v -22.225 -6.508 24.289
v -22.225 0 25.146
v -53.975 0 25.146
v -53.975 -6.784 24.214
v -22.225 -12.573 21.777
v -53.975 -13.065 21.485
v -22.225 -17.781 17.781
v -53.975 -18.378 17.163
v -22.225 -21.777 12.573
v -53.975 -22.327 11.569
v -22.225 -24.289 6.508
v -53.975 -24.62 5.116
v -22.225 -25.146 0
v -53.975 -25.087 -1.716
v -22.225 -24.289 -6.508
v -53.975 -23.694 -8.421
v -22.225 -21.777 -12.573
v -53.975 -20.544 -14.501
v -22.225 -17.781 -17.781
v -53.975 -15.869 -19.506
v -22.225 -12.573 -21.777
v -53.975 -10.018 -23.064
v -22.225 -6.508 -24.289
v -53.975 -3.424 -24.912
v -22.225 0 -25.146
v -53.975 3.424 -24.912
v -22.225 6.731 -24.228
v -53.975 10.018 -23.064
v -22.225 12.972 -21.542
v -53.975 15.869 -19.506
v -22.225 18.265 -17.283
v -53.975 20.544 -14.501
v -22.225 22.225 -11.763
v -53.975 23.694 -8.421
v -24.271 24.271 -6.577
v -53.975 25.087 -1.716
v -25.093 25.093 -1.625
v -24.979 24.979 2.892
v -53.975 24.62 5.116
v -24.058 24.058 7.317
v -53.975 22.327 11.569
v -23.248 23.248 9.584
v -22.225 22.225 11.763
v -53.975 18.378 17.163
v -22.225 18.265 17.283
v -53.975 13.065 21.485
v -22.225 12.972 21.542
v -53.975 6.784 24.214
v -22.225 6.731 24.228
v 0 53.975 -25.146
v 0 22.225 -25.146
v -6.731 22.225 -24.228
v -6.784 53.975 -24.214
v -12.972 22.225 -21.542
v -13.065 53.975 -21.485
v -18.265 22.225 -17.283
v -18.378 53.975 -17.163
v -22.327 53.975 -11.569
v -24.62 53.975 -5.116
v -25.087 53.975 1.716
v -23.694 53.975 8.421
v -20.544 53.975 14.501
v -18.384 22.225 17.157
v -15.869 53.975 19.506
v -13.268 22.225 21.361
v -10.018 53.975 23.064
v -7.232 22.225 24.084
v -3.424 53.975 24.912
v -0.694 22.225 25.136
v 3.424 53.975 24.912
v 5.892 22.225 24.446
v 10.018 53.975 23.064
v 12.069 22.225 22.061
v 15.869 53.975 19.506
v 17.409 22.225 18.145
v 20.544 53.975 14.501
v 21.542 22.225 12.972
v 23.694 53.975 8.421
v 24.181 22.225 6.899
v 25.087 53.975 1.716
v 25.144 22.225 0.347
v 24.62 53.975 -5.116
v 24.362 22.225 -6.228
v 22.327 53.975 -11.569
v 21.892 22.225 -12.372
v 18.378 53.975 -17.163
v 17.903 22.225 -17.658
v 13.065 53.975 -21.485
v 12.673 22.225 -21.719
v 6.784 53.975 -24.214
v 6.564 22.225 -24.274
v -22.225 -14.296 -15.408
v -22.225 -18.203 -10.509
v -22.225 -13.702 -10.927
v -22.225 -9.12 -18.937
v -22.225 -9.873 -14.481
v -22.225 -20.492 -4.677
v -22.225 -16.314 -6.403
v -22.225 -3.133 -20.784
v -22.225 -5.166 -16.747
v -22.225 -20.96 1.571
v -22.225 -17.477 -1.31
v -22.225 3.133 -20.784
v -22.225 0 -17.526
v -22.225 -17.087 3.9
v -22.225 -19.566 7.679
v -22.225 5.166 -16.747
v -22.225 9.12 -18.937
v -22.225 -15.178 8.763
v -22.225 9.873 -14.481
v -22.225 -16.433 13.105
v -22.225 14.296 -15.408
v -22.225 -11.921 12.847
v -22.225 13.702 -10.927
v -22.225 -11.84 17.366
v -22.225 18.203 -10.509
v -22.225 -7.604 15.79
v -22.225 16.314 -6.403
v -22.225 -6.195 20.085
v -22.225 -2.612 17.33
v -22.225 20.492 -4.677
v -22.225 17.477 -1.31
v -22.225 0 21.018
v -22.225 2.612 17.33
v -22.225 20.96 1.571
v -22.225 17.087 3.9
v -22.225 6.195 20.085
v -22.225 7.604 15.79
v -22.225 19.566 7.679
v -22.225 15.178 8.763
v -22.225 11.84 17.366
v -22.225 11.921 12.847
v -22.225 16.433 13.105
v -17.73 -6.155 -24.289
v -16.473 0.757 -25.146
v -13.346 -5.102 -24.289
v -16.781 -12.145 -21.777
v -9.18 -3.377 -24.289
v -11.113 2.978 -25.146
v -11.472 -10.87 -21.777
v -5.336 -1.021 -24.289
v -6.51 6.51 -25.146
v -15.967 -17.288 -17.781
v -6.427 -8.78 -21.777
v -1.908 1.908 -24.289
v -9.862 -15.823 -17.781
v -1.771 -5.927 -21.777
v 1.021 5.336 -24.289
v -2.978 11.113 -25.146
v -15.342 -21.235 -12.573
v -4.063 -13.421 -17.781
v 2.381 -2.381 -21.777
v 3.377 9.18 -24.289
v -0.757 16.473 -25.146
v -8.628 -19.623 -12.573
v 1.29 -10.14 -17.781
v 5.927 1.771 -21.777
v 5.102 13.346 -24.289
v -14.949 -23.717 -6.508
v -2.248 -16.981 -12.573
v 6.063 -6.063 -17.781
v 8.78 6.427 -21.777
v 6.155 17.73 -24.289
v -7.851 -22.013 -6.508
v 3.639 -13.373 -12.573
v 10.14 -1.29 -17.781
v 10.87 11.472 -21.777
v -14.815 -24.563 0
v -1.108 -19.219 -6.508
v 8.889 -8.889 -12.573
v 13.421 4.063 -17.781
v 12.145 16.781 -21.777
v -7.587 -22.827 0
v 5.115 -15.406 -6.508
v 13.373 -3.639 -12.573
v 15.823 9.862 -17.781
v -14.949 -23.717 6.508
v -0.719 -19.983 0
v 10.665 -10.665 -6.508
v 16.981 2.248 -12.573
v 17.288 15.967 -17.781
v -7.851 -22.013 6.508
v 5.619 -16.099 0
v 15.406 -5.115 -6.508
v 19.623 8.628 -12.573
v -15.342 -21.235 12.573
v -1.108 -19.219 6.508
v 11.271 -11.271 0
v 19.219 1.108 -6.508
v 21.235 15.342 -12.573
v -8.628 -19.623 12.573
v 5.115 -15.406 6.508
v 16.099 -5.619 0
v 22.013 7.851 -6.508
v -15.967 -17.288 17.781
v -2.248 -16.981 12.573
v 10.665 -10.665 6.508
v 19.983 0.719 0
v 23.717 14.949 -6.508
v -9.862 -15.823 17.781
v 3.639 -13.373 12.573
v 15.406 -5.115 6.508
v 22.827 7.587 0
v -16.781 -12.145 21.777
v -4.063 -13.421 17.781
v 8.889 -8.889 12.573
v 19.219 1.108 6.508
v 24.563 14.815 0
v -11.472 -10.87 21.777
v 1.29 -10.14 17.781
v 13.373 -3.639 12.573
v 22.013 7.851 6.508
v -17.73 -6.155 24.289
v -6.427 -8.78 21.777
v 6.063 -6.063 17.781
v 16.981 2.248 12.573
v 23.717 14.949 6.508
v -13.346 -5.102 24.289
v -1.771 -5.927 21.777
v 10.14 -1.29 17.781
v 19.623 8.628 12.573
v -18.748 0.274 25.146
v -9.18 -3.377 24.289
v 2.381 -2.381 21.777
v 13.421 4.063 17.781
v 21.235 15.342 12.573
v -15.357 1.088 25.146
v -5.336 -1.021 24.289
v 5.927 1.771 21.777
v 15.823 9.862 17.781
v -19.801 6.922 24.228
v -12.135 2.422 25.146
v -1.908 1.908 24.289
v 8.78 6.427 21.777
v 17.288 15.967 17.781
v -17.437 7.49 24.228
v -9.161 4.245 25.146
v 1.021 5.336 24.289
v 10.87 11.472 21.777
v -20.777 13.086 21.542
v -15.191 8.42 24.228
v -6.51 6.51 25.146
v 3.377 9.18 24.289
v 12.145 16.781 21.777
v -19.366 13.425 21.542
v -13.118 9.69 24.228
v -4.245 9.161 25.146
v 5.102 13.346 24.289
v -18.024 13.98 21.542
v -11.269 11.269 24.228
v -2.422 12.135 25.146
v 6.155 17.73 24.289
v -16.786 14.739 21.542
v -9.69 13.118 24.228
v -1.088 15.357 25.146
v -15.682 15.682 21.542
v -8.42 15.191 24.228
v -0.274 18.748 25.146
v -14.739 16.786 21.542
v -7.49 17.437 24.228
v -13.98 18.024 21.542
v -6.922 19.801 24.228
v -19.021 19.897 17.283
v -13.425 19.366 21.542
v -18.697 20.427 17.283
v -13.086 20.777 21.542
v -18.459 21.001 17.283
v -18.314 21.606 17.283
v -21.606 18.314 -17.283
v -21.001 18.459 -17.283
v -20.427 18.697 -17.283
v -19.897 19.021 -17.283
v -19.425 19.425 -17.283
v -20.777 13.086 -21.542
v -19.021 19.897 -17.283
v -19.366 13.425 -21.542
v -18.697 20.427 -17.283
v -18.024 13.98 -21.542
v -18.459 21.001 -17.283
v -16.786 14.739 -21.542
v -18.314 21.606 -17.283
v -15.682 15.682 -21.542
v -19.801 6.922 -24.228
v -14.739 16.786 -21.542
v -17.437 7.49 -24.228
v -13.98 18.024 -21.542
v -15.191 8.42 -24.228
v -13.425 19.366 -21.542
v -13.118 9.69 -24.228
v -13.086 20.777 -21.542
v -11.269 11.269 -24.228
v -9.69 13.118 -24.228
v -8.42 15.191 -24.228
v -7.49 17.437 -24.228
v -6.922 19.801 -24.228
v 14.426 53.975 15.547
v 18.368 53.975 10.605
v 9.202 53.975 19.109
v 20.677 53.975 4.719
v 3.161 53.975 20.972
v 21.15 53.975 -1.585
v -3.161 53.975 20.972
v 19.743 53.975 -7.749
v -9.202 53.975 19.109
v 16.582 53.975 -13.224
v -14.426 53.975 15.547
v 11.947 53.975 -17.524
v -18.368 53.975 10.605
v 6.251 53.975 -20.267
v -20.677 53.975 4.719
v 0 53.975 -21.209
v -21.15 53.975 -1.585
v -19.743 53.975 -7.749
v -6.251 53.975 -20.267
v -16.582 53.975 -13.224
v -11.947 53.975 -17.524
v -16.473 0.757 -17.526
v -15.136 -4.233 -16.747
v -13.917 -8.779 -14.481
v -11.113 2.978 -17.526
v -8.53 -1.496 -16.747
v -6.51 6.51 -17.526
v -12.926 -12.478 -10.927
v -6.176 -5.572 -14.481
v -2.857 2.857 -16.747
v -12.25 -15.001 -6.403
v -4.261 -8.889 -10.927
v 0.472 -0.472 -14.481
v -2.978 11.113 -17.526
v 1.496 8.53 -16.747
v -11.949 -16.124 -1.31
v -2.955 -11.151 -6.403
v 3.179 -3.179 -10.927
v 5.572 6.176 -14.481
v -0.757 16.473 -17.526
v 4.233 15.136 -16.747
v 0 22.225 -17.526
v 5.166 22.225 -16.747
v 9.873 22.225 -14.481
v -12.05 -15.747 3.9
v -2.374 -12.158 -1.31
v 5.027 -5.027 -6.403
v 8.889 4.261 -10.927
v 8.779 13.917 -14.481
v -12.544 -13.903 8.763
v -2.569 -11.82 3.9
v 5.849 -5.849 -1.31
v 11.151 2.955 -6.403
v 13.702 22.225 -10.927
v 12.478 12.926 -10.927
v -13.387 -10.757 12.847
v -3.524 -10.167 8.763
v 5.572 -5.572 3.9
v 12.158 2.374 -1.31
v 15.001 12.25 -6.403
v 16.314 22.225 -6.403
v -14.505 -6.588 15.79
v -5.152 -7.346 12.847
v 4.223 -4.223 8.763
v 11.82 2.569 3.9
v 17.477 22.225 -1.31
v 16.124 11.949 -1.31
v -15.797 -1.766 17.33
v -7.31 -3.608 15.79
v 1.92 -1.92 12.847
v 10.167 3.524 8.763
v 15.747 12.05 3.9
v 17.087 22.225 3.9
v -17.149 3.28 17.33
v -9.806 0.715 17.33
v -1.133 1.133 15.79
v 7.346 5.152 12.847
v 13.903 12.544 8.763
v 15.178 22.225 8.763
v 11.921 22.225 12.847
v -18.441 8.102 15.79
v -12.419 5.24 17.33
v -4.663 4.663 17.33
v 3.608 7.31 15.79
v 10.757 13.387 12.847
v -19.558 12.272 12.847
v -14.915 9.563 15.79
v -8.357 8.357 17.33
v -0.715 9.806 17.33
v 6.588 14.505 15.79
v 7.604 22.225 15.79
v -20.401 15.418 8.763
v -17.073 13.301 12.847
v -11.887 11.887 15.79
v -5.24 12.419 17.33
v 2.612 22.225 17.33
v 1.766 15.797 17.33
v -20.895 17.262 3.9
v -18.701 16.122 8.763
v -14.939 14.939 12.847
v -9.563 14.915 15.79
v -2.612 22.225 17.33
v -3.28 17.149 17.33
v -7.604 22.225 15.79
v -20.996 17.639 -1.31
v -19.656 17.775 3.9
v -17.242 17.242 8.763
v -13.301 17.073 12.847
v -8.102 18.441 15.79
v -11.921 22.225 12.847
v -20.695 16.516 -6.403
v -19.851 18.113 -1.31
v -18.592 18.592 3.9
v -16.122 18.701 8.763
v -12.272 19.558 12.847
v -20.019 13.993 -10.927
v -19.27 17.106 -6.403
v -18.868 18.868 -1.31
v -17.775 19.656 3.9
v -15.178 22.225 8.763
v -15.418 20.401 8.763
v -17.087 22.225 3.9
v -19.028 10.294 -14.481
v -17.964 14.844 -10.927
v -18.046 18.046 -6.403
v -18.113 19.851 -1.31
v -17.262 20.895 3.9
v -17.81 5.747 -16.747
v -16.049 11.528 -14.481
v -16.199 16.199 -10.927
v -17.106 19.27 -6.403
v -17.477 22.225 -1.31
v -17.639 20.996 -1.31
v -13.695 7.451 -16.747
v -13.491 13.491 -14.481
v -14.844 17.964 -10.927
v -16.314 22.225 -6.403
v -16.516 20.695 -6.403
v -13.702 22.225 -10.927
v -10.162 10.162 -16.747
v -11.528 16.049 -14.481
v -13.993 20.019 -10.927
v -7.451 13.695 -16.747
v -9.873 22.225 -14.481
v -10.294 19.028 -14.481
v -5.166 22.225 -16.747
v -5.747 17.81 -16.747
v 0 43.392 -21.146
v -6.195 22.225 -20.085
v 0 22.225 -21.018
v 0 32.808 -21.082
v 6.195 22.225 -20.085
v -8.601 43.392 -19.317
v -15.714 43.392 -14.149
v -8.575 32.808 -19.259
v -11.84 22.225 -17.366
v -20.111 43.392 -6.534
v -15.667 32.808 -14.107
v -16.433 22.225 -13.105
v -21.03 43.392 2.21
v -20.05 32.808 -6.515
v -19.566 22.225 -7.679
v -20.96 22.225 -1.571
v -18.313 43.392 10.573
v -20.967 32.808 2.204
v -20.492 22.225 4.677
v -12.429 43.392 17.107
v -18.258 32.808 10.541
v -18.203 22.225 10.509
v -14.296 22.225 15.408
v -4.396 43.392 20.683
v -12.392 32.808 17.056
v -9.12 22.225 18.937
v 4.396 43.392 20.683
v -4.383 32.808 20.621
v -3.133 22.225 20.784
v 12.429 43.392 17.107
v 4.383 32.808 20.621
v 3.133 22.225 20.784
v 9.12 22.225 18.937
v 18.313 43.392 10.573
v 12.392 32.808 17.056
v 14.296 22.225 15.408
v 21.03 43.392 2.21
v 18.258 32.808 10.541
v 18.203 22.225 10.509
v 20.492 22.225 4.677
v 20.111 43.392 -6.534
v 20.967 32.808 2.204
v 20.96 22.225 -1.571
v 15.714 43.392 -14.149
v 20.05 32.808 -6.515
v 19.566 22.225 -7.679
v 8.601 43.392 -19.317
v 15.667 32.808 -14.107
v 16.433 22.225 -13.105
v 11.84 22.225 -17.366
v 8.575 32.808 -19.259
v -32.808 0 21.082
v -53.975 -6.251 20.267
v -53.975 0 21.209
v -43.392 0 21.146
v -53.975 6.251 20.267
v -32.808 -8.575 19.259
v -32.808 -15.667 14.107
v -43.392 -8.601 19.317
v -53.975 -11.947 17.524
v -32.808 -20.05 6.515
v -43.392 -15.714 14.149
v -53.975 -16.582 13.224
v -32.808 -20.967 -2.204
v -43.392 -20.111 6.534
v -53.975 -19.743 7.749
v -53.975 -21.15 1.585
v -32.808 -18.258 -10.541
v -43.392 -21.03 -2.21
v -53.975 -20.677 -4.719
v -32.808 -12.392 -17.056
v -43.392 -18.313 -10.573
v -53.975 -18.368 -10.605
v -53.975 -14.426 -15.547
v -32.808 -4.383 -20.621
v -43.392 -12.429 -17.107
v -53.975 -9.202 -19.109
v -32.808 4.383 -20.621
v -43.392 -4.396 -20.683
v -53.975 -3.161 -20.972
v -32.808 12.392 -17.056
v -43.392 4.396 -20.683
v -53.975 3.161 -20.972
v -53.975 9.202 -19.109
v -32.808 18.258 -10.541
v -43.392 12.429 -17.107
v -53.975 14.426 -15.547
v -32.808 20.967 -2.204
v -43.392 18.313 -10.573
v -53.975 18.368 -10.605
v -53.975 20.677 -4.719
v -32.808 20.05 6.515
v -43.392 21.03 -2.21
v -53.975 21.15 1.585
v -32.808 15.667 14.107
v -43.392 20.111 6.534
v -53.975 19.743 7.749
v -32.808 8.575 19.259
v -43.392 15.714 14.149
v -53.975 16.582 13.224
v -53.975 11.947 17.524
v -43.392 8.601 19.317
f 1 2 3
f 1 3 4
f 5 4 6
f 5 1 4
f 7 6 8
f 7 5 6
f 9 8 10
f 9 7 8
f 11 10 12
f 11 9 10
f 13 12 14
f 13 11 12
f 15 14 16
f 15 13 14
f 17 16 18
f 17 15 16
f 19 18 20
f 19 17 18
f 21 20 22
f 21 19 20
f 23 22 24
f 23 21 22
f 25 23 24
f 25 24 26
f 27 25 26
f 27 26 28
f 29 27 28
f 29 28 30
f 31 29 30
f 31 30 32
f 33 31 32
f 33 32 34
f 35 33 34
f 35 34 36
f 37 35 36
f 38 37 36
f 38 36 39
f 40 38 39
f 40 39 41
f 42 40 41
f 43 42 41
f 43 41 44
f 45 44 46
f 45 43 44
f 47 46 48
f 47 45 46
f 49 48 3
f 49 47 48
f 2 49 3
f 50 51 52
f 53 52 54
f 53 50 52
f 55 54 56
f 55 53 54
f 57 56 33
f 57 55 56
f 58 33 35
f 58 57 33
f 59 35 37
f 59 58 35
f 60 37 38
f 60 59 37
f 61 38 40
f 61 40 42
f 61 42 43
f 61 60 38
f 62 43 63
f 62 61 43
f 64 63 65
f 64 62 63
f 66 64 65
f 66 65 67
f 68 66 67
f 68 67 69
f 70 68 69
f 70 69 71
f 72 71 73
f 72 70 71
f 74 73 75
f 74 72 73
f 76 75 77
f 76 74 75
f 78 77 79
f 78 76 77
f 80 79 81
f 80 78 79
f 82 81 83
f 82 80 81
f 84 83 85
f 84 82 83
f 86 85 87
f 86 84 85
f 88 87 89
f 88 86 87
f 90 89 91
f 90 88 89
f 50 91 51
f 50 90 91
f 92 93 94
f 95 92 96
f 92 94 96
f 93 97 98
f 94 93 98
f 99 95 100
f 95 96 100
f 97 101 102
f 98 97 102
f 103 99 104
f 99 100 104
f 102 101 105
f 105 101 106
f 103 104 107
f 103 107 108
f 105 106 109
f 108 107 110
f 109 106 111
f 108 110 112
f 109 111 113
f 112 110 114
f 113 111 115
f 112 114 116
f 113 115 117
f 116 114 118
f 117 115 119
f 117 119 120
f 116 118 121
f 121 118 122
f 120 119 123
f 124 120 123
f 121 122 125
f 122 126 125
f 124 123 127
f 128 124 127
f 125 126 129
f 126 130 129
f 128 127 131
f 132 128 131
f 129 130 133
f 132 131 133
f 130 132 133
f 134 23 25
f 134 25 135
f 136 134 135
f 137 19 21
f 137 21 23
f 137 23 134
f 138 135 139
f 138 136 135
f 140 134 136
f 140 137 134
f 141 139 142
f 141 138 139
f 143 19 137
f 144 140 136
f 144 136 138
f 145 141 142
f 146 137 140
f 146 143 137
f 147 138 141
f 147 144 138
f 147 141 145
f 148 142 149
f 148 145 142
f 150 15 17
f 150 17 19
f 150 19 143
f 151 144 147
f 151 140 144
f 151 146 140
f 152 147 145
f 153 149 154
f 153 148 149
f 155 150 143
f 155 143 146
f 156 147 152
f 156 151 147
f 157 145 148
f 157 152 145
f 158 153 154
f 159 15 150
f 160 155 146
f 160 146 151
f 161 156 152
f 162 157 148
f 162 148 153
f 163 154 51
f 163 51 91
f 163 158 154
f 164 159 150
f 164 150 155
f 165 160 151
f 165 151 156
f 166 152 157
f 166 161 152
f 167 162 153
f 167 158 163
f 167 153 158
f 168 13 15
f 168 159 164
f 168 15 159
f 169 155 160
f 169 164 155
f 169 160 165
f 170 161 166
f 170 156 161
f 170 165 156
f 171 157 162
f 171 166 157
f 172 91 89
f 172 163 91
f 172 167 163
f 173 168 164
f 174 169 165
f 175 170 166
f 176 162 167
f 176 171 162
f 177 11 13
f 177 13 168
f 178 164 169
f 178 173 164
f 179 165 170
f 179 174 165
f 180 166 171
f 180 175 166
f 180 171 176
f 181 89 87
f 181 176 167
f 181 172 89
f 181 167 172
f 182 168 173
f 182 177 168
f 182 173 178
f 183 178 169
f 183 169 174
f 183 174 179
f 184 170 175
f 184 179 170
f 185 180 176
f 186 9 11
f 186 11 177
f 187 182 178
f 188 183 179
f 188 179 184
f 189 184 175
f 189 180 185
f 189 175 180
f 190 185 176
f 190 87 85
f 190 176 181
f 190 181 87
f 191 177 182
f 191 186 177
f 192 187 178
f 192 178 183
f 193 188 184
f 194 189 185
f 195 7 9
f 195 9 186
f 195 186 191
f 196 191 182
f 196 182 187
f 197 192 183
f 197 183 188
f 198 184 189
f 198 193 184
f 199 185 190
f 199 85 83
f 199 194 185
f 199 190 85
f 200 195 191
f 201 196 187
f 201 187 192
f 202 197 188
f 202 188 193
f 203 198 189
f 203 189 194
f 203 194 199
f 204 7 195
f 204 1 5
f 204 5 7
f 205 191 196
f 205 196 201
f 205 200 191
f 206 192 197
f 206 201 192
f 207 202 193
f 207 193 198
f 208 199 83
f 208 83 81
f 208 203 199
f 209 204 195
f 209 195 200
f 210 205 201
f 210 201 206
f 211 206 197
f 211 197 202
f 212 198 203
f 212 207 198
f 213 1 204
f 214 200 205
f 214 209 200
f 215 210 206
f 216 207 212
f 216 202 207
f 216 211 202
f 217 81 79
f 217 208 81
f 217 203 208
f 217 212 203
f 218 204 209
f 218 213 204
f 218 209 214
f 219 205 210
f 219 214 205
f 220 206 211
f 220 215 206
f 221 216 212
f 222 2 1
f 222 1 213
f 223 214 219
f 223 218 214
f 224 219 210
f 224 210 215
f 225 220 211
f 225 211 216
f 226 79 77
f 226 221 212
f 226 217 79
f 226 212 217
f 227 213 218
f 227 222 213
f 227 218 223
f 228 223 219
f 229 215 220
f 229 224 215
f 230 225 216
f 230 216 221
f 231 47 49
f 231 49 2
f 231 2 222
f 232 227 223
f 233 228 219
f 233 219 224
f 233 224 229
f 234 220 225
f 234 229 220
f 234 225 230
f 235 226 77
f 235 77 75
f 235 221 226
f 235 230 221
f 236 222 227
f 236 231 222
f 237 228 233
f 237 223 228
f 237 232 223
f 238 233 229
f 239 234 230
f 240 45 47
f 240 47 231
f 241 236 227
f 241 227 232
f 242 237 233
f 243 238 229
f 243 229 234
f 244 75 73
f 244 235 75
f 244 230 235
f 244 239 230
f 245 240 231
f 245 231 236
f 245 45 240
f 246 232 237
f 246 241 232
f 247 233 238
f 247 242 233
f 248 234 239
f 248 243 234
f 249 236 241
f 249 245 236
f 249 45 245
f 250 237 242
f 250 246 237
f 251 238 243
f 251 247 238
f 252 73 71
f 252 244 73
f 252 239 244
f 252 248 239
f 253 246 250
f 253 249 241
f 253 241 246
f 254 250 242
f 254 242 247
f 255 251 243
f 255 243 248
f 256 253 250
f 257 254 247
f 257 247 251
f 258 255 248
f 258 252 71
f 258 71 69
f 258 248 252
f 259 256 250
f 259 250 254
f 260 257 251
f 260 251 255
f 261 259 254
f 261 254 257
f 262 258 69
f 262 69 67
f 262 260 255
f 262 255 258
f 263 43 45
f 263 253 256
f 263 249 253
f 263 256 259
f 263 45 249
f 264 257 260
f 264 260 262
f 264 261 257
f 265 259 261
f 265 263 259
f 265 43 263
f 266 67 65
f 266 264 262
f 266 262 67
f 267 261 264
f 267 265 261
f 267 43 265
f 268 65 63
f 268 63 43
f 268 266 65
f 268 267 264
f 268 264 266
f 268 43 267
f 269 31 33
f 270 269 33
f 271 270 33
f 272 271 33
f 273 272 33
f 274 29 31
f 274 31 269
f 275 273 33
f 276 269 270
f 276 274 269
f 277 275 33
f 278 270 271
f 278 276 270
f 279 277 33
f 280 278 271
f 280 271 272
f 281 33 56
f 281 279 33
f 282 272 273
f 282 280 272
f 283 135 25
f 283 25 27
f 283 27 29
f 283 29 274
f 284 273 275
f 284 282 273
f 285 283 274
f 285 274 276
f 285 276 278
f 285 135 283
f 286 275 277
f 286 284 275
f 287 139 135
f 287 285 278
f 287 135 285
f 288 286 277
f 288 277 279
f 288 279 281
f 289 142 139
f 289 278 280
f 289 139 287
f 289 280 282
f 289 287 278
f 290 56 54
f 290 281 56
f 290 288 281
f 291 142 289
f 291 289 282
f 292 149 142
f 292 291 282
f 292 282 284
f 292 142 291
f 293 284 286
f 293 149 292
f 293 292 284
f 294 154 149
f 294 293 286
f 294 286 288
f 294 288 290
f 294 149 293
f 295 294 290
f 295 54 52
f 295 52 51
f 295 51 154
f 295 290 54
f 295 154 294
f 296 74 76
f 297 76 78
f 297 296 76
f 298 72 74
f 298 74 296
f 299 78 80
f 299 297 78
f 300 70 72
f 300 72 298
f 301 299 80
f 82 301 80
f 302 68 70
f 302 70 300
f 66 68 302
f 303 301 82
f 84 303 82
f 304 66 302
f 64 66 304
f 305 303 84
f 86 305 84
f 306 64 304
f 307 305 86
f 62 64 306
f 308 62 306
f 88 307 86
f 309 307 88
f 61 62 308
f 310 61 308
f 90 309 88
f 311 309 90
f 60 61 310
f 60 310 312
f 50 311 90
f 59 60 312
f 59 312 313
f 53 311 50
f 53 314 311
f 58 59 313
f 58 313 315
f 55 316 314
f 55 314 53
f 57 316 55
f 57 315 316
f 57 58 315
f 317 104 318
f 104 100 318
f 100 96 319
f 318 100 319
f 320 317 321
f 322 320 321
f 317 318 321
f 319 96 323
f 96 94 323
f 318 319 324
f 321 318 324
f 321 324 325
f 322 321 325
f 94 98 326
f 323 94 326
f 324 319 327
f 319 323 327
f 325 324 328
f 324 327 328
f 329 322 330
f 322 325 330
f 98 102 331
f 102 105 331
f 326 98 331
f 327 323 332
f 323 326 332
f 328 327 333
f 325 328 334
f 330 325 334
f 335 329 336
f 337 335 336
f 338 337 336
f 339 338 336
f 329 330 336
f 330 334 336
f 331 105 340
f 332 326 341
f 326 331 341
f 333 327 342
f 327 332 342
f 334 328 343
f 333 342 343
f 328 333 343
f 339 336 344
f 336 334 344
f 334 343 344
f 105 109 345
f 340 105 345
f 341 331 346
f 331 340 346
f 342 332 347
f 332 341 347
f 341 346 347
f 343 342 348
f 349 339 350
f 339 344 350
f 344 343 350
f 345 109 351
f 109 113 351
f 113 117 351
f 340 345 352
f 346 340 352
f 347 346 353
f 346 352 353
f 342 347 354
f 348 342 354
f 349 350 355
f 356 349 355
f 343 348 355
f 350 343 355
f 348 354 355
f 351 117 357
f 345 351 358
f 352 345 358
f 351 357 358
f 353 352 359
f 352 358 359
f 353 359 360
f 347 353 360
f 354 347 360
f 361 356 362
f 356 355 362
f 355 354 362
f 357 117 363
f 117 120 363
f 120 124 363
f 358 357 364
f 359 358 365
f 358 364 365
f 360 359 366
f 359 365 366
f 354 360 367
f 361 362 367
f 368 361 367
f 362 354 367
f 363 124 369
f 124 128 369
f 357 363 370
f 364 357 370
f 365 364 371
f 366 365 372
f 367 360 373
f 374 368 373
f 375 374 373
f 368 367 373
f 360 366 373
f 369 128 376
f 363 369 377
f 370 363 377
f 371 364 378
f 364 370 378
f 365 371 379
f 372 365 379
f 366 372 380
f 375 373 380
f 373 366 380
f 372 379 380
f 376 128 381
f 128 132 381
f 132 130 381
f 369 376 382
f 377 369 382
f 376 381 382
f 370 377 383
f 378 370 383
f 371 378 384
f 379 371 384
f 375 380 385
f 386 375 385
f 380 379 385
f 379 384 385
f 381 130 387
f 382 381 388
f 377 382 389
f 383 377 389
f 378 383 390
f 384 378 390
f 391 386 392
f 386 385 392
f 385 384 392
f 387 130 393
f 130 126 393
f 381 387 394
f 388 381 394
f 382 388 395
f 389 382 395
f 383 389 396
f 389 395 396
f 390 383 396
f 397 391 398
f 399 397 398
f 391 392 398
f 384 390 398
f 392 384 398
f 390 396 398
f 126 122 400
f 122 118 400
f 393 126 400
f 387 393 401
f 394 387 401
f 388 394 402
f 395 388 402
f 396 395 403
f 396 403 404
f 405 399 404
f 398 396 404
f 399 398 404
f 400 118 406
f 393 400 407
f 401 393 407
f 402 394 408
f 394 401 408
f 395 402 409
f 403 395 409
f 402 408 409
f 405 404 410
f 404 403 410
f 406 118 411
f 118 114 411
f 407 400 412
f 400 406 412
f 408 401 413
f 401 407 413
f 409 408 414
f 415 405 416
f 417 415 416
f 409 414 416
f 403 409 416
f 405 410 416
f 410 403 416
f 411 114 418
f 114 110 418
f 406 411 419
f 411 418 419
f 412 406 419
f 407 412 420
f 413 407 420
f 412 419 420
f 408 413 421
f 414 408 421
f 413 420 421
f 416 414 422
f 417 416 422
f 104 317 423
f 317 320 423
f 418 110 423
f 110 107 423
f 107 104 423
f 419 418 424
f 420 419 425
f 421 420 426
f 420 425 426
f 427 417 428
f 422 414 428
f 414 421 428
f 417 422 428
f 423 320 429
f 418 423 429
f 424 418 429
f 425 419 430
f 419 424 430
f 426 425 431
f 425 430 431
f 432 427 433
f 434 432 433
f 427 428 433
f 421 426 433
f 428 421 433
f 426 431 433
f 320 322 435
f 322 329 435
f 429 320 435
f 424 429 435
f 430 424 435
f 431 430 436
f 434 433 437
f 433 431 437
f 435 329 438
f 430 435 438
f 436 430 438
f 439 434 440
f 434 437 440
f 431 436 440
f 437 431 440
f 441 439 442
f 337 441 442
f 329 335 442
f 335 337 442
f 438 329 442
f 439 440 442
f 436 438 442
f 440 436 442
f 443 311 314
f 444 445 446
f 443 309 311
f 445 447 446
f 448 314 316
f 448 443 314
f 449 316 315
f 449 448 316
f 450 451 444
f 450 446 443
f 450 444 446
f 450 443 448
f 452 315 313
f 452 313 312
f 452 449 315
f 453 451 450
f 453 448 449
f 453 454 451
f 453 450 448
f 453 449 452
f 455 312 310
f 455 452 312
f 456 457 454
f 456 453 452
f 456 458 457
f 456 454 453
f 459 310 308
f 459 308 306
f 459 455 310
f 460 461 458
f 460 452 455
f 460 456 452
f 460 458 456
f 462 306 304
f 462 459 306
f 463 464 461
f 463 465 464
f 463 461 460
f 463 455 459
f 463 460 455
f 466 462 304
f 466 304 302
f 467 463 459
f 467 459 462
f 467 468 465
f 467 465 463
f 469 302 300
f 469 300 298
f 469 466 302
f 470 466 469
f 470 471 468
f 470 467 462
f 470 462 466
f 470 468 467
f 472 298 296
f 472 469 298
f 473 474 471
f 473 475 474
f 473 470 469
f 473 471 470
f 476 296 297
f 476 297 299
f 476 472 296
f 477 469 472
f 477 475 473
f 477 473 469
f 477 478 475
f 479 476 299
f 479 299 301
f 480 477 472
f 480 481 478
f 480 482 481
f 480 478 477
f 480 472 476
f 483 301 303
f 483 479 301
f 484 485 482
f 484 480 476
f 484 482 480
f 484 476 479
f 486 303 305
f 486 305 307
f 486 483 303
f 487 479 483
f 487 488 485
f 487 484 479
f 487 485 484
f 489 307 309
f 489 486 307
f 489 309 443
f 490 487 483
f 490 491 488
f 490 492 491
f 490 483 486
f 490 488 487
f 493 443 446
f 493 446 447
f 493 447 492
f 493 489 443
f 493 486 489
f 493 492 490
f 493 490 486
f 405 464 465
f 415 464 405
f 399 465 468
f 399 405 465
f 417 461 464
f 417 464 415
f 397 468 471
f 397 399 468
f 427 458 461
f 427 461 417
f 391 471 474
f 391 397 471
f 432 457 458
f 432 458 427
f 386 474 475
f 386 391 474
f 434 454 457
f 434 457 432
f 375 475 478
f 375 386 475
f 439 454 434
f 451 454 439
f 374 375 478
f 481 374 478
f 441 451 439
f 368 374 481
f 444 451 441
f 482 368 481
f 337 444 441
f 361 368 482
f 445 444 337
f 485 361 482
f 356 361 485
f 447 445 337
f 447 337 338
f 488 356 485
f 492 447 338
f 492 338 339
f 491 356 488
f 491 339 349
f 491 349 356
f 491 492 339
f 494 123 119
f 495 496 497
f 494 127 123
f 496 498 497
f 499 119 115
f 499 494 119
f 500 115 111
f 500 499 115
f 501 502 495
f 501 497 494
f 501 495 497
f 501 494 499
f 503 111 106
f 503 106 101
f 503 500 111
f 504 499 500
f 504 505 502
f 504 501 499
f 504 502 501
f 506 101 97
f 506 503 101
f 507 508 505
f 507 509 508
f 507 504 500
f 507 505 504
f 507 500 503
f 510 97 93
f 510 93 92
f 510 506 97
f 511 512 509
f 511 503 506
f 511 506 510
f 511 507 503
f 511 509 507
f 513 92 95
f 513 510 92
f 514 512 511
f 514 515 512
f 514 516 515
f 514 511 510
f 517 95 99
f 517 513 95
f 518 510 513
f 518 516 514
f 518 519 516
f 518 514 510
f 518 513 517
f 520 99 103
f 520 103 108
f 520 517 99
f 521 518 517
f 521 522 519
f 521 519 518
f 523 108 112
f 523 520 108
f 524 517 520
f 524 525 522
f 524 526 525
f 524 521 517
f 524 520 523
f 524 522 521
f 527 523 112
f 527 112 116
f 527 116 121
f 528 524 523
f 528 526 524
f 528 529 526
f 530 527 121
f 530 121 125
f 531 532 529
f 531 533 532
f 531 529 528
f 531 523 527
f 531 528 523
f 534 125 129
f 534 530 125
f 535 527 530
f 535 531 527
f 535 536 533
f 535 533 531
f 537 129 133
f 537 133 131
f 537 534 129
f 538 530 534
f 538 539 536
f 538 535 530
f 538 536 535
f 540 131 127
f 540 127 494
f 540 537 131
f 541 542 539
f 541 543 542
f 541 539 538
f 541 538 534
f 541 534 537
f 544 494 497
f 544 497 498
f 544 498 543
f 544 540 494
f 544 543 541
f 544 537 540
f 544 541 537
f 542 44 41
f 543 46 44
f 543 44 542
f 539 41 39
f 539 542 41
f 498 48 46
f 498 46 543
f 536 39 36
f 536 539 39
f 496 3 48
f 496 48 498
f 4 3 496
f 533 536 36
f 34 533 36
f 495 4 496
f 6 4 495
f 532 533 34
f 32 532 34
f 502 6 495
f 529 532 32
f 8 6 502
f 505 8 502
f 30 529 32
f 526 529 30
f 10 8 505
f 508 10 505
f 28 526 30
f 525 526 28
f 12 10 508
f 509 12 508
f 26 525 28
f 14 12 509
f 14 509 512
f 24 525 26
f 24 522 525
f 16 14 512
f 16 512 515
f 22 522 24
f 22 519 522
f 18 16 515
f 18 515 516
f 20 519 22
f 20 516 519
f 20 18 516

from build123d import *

# Parameters (mm, degrees)
SKETCH3_R   = 25.146
SKETCH3_R_2 = 17.526


with BuildPart() as part:
    # Sketch1 → Revolve1 (revolve)
    with BuildSketch(Plane.XY):
        Polygon((-53.975, -25.146), (-22.225, -25.146), (-22.225, -21.0185), (-53.975, -21.209), align=None)
    revolve(axis=Axis((-53.975, 0, 0), (1, 0, 0)))


with BuildPart() as body_2:
    # Sketch2 → Revolve2 (revolve)
    with BuildSketch(Plane.XY):
        Polygon((21.209, 53.975), (21.0185, 22.225), (25.146, 22.225), (25.146, 53.975), align=None)
    revolve(axis=Axis((0, 0, 0), (0, 1, 0)))


with BuildPart() as sweep1_tool:
    # Sweep1: sweep along a path in Sketch4
    with BuildLine(Plane.XY) as sweep1_path:
        ThreePointArc((-22.225, 0), (-6.509552, 6.509552), (0, 22.225))
    # Sketch3 → Sweep1 (sweep)
    with BuildSketch(Plane(origin=(-22.225, 0, 0), x_dir=(0, 0, -1), z_dir=(1, 0, 0))):
        Circle(SKETCH3_R)
        Circle(SKETCH3_R_2, mode=Mode.SUBTRACT)
    sweep(path=sweep1_path.line)


with BuildPart() as part_1:
    add(part.part)


with BuildPart() as part_2:
    # Sweep1: joined with sweep1_tool
    add(part_1.part.fuse(sweep1_tool.part, body_2.part, tol=0.00001))


solid = part_2.part
